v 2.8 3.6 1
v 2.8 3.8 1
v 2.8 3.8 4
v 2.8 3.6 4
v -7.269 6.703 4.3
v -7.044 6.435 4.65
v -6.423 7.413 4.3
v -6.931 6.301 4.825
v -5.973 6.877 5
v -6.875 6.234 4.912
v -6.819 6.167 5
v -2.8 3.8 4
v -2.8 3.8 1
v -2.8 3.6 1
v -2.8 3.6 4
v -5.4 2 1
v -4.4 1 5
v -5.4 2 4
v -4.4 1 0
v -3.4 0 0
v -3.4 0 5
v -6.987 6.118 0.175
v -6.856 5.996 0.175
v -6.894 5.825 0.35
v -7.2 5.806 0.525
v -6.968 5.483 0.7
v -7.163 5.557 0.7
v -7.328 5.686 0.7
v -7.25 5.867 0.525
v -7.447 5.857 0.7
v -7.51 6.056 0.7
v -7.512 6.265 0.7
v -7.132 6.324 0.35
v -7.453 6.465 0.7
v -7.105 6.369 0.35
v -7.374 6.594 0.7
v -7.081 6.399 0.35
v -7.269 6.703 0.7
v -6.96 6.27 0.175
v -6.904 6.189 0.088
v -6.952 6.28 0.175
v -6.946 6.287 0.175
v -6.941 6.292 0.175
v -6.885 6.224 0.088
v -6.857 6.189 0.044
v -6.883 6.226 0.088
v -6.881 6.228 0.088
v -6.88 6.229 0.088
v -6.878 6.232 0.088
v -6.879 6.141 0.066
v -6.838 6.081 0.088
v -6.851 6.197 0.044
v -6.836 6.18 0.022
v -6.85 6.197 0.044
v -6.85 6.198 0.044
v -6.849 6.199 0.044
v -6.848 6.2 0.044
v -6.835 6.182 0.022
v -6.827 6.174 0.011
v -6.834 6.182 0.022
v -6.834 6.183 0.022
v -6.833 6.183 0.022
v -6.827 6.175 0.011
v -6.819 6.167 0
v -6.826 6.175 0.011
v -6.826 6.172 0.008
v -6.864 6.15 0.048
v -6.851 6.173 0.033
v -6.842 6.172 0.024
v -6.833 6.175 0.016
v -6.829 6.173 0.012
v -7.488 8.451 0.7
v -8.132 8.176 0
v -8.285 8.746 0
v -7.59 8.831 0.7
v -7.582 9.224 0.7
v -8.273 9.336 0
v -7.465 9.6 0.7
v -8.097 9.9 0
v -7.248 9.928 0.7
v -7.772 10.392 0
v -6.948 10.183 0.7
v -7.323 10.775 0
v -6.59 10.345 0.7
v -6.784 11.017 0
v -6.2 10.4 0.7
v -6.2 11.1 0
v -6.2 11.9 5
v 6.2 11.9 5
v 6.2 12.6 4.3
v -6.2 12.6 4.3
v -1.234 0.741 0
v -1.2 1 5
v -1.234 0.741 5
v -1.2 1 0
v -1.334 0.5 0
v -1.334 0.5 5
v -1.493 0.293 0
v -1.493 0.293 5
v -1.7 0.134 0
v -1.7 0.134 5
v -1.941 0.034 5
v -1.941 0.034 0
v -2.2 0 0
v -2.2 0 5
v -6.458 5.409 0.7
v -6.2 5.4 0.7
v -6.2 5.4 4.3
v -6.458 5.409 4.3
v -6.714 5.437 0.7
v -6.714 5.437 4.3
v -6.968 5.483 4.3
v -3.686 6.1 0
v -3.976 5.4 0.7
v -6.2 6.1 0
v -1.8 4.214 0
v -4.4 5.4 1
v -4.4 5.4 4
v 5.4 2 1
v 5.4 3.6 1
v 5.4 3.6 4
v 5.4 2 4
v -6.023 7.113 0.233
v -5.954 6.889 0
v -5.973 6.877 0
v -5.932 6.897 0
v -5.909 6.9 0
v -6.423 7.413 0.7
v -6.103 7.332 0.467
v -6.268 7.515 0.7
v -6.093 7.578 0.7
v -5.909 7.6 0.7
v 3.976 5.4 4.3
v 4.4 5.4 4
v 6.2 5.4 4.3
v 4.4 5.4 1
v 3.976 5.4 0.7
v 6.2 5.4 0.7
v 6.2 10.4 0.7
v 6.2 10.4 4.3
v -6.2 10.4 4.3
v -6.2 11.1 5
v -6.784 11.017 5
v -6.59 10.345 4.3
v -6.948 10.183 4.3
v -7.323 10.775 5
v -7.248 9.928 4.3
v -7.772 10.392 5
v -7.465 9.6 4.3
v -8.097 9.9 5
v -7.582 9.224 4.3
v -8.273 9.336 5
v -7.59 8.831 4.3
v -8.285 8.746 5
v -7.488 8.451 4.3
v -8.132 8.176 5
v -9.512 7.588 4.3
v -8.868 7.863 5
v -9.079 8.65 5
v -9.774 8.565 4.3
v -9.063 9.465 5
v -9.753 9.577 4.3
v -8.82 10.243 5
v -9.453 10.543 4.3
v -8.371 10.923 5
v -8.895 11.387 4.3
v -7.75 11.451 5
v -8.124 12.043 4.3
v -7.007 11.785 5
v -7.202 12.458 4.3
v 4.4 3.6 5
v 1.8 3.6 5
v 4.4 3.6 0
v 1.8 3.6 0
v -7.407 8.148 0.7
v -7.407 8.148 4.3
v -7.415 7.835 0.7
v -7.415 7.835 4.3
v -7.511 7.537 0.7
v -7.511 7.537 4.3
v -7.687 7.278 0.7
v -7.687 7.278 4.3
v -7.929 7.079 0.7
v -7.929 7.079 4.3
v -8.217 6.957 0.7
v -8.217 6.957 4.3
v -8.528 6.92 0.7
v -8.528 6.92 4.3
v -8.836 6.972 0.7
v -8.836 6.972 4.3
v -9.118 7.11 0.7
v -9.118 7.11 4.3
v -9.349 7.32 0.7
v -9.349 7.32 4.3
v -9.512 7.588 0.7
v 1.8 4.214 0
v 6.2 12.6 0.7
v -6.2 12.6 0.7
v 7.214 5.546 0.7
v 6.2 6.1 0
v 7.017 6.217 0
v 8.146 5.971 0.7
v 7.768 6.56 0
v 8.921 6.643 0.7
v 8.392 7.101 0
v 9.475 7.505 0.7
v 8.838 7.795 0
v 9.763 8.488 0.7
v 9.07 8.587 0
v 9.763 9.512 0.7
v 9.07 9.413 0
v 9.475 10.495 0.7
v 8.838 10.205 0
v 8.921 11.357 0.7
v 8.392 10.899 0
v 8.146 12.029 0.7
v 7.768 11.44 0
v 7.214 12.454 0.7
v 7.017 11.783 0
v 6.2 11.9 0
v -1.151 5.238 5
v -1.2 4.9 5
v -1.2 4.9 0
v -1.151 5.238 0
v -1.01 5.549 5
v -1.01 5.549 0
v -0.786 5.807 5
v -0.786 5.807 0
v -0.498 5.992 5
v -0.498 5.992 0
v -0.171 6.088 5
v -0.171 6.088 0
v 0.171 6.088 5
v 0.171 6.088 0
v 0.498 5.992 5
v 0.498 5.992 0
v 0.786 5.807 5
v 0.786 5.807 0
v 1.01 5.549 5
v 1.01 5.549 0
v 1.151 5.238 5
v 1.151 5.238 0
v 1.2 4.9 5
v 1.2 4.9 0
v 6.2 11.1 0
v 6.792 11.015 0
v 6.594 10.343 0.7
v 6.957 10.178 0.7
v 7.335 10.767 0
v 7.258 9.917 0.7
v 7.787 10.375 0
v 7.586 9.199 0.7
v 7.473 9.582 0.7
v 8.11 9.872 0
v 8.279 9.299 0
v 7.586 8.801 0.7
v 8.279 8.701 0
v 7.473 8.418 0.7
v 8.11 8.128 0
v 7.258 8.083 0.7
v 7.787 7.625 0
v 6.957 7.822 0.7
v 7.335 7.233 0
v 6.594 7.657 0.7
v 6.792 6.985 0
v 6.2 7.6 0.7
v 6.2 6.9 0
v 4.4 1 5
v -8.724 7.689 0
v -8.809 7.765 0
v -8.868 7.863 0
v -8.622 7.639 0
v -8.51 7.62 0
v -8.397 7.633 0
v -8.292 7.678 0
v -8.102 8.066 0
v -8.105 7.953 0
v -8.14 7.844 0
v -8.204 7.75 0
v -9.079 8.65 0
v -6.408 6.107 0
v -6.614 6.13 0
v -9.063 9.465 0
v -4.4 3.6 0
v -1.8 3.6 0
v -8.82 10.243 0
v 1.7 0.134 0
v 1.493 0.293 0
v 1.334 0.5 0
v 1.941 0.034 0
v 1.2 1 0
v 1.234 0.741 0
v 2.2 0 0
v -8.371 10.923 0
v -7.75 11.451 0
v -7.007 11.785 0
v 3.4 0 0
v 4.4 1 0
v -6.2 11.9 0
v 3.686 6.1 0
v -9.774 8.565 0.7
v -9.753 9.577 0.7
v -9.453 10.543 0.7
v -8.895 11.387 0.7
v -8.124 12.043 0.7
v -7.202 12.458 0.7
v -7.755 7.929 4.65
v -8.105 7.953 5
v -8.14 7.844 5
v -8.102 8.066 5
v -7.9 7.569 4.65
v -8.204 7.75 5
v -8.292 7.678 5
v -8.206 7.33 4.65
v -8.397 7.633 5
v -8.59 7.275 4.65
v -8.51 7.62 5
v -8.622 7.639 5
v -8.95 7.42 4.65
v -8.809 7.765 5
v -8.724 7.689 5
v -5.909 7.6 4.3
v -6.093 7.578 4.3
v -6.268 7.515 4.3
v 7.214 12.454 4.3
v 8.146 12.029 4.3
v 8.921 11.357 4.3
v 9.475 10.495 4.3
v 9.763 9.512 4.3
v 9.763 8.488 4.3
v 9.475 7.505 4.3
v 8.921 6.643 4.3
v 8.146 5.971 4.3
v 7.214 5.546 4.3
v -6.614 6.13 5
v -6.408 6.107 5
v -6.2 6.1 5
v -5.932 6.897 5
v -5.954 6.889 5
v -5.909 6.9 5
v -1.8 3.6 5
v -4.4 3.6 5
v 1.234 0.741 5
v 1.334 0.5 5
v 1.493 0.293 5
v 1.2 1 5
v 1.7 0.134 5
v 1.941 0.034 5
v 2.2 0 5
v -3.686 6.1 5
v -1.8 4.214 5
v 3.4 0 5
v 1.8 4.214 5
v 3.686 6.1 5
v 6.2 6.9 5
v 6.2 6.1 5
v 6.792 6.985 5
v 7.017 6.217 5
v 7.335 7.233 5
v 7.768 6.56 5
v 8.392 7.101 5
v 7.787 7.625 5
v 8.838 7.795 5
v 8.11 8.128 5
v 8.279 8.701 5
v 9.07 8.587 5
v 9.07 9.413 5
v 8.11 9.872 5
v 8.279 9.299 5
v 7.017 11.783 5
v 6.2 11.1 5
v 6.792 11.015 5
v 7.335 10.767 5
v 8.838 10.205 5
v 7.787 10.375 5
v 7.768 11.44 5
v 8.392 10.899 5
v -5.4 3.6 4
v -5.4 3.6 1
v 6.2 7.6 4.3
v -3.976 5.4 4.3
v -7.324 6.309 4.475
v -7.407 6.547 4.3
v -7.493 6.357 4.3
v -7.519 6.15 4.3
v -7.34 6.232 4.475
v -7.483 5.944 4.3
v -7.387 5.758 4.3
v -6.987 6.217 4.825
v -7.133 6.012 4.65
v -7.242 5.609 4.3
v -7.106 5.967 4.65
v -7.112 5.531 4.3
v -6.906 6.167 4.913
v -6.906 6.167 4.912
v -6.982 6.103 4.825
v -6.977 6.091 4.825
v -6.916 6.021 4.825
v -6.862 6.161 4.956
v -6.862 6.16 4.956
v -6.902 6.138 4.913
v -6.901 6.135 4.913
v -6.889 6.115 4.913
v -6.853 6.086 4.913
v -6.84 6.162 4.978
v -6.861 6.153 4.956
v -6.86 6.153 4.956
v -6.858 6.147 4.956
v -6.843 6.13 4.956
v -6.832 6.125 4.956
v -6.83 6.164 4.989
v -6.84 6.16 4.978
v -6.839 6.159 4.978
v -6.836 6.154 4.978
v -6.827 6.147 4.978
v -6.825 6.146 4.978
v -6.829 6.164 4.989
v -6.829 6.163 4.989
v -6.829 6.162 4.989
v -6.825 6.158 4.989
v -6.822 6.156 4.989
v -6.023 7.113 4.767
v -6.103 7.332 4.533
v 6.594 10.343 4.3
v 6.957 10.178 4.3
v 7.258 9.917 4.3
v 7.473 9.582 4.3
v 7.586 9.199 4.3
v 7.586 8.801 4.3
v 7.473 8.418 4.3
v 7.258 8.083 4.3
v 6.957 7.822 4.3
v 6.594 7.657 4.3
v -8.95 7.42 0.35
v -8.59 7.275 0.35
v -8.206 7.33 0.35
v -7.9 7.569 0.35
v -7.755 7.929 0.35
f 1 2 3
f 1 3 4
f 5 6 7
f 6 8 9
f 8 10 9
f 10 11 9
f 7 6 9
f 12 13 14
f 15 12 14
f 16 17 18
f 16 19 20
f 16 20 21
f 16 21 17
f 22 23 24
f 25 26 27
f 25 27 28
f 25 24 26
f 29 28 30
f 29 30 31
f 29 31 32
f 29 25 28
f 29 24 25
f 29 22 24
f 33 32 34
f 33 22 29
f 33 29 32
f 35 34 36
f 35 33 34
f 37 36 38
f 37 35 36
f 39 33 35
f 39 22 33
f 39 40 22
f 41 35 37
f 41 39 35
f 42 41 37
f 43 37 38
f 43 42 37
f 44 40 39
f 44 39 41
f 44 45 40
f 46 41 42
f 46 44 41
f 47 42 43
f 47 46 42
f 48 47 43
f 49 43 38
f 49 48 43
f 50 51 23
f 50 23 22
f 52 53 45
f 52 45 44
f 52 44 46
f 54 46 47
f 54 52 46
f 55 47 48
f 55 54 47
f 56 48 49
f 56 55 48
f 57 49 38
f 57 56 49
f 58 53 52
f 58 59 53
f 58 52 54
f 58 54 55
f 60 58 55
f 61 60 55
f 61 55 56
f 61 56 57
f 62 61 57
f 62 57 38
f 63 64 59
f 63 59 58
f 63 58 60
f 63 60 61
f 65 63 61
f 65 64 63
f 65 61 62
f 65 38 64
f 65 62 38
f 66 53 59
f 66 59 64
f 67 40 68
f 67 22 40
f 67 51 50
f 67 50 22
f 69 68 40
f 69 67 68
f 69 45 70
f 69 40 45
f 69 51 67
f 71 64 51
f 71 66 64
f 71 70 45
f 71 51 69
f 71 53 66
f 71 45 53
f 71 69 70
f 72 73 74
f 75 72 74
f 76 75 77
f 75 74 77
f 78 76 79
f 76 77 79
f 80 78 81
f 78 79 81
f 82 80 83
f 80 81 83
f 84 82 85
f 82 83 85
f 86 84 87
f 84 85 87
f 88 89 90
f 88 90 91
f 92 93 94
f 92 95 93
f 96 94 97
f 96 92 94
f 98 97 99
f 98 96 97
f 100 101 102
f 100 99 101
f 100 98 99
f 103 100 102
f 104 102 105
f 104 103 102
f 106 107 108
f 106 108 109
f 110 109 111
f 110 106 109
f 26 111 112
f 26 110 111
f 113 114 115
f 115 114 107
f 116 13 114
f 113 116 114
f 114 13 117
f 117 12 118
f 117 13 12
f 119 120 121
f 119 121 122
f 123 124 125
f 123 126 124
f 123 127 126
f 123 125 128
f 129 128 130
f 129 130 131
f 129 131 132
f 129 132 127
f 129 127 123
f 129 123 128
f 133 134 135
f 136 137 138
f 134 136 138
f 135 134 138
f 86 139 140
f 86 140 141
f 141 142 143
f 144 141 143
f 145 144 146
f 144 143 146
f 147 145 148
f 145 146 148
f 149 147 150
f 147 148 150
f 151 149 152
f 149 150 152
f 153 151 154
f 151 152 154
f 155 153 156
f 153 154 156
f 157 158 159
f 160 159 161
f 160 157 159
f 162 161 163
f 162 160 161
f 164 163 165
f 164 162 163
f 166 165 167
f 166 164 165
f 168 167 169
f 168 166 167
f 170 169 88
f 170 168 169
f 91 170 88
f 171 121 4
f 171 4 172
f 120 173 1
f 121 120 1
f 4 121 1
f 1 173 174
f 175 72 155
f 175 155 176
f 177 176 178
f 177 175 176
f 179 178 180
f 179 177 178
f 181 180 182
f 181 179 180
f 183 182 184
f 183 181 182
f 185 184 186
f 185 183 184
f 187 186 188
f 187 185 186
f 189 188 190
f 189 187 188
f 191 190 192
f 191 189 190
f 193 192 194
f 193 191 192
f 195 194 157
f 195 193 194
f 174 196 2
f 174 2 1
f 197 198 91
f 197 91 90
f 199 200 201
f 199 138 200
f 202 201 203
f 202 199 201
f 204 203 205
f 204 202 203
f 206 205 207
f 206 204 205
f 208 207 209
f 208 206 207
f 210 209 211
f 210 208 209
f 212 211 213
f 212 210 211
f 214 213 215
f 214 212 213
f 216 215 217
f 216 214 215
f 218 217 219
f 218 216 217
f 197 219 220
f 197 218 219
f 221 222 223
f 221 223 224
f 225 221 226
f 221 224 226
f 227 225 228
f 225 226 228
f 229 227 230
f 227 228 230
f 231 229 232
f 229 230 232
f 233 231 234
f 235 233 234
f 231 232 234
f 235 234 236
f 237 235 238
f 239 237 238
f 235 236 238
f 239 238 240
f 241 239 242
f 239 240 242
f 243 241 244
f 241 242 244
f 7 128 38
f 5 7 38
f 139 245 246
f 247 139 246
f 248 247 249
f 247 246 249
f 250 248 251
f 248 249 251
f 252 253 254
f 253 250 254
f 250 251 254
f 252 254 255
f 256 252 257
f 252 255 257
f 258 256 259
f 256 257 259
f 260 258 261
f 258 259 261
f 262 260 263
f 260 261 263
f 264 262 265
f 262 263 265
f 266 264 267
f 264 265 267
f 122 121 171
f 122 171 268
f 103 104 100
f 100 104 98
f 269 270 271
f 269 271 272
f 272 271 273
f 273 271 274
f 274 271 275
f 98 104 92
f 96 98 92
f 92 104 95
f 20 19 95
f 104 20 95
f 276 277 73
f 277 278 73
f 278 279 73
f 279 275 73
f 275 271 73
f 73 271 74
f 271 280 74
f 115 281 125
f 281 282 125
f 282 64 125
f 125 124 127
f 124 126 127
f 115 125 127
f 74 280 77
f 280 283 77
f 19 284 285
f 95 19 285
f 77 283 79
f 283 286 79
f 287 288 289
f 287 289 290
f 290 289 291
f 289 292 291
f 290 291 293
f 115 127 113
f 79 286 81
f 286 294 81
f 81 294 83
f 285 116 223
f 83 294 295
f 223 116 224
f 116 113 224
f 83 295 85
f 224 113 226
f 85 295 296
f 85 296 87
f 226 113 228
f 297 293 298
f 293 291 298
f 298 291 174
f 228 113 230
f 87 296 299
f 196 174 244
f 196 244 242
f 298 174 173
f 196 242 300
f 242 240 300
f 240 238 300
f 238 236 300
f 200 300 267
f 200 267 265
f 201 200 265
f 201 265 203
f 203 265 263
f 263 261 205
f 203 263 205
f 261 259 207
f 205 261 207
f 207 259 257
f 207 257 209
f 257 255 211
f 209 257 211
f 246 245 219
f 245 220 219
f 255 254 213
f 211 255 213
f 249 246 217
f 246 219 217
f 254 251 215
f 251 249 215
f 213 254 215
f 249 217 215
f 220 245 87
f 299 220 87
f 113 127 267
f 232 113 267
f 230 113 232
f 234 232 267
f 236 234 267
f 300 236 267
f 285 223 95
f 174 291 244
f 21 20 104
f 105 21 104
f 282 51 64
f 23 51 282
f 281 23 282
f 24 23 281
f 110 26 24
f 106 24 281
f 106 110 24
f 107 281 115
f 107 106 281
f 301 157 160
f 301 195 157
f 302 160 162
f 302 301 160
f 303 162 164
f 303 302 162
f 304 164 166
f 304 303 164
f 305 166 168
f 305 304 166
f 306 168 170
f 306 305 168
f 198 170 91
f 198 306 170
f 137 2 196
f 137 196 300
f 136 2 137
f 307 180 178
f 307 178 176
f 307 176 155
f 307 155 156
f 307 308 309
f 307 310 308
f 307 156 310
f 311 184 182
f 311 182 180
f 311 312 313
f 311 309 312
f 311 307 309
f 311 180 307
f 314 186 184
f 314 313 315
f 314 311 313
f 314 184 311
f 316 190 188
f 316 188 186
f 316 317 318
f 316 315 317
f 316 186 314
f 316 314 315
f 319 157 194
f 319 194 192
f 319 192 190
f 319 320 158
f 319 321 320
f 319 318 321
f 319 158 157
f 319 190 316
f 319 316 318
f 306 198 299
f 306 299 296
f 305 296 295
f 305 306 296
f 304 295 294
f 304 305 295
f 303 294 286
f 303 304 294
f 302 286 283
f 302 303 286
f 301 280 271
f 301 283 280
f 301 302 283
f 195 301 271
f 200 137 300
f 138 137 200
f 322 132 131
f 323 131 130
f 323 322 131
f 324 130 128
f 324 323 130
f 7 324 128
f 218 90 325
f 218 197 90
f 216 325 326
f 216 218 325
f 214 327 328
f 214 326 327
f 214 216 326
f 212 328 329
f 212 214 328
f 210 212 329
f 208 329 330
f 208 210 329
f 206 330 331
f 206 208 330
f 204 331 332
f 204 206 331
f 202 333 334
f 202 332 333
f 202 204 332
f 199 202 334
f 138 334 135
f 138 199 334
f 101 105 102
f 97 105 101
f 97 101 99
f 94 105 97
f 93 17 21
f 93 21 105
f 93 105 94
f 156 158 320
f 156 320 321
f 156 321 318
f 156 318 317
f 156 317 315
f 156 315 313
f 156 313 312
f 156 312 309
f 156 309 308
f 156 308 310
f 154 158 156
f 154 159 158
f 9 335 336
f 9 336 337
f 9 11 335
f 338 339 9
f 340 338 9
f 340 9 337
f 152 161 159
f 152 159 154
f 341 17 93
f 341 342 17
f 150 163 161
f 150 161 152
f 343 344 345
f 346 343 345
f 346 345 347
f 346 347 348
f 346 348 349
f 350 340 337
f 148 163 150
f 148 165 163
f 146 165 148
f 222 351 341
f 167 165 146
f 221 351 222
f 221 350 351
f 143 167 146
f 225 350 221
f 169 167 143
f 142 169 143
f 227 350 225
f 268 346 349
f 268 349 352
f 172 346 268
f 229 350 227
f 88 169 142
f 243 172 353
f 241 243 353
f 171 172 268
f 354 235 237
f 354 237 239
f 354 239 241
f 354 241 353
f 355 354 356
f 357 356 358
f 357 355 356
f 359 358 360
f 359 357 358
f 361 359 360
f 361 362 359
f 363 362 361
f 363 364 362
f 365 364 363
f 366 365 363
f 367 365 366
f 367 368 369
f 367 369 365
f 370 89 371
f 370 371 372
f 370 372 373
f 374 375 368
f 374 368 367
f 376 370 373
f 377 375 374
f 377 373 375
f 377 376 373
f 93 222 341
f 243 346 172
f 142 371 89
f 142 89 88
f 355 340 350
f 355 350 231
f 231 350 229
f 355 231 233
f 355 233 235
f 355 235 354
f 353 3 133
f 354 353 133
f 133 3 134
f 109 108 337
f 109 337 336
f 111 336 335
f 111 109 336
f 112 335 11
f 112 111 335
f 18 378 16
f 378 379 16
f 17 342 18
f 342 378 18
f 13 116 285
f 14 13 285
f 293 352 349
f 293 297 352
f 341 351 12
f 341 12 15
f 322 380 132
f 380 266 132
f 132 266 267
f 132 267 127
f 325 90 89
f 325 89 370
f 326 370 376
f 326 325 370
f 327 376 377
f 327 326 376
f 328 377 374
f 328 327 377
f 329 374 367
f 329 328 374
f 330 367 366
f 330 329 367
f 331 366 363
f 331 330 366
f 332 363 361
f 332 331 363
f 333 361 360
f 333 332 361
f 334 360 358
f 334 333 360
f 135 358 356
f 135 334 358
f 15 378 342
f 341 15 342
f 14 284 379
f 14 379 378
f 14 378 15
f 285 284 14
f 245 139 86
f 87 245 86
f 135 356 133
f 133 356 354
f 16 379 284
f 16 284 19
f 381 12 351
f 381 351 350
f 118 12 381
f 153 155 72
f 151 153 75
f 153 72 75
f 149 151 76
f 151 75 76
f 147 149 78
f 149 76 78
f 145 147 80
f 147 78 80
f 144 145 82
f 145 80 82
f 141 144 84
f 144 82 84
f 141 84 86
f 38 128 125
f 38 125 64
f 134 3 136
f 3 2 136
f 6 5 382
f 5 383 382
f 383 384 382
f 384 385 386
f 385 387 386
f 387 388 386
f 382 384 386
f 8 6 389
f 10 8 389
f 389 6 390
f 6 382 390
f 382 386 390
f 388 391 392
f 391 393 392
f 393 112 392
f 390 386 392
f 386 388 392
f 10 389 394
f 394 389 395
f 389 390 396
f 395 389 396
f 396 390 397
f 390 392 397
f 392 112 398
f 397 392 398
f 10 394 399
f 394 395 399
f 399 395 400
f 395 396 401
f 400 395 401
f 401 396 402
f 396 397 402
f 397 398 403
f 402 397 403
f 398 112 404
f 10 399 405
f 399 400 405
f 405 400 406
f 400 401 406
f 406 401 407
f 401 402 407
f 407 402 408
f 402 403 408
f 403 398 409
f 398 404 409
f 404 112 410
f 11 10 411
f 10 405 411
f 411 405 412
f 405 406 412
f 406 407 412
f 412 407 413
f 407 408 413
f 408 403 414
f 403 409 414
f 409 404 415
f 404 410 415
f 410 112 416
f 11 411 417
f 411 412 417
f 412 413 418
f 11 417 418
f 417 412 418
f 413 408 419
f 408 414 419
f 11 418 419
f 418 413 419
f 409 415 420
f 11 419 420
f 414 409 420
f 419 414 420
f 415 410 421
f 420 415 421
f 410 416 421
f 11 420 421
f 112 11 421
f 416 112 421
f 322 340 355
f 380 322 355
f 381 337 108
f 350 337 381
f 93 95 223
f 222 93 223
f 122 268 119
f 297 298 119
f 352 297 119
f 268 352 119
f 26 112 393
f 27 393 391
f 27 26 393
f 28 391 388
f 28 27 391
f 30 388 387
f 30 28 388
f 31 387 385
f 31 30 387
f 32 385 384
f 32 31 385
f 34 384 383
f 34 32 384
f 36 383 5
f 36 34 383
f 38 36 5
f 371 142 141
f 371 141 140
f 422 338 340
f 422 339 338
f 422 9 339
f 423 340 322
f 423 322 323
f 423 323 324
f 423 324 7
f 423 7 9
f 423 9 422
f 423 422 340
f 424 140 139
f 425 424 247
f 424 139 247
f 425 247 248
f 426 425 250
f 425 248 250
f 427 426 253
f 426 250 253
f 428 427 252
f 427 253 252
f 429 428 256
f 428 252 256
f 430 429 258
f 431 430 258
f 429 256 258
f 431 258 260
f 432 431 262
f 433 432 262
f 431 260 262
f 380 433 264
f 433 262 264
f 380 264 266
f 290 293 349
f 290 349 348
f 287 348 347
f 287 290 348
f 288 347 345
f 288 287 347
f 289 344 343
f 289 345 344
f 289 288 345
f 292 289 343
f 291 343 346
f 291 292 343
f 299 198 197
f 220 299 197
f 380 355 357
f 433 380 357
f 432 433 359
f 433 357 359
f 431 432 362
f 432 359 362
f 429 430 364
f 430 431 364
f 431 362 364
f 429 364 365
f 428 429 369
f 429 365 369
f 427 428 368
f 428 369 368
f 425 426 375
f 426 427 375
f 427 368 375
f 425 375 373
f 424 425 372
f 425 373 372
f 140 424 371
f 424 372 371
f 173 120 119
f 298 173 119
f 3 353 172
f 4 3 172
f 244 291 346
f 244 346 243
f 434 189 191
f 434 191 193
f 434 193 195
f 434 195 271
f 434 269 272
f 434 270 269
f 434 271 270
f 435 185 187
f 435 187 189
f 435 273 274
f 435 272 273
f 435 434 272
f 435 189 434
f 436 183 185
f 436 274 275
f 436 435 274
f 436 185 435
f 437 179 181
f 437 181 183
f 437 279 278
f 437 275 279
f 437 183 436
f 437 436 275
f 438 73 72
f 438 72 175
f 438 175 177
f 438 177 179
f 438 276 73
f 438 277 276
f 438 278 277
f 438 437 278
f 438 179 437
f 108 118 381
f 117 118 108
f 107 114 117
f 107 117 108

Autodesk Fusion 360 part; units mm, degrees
sketch "base" plane through (0, 0, 0) normal (0, 0, 1) x (1, 0, 0)
  line L0 (-3.4, 0) -> (-2.2, 0)
  arc A0 (-2.2, 0) -> (-1.2, 1) centre (-2.2, 1) ccw
  line L1 (-1.2, 1) -> (-1.2, 4.9)
  line L2 (-3.4, 0) -> (-5.4, 2)
  line L3 (-5.4, 3.6) -> (-2.8, 3.6)
  line L4 (-2.8, 3.8) -> (-4.4, 5.4)
  line L5 (-2.2, 0) -> (0, 0) construction
  line L6 (-5.4, 3.6) -> (-5.4, 2)
  line L7 (0, 7.6) -> (-6.2, 7.6)
  arc A1 (-6.2, 10.4) -> (-6.2, 7.6) centre (-6.2, 9) ccw
  line L8 (-6.2, 10.4) -> (0, 10.4)
  line L9 (-4.4, 5.4) -> (-6.2, 5.4)
  arc A2 (-6.2, 12.6) -> (-6.2, 5.4) centre (-6.2, 9) ccw
  line L10 (-6.2, 12.6) -> (0, 12.6)
  line L11 (0, 12.6) -> (0, 0) construction
  line L12 (-2.8, 3.8) -> (-2.8, 3.6)
  arc A3 (6.2, 7.6) -> (6.2, 10.4) centre (6.2, 9) ccw
  line L13 (6.2, 10.4) -> (0, 10.4)
  line L14 (0, 7.6) -> (6.2, 7.6)
  arc A4 (0, 6.1) -> (-1.2, 4.9) centre (0, 4.9) ccw
  line L15 (6.2, 12.6) -> (0, 12.6)
  arc A5 (6.2, 5.4) -> (6.2, 12.6) centre (6.2, 9) ccw
  line L16 (4.4, 5.4) -> (6.2, 5.4)
  line L17 (2.8, 3.8) -> (4.4, 5.4)
  line L18 (2.8, 3.8) -> (2.8, 3.6)
  line L19 (5.4, 3.6) -> (2.8, 3.6)
  line L20 (5.4, 3.6) -> (5.4, 2)
  line L21 (3.4, 0) -> (5.4, 2)
  line L22 (3.4, 0) -> (2.2, 0)
  arc A6 (1.2, 1) -> (2.2, 0) centre (2.2, 1) ccw
  arc A7 (1.2, 4.9) -> (0, 6.1) centre (0, 4.9) ccw
  line L23 (1.2, 1) -> (1.2, 4.9)
  line L24 (-6.2, 7.6) -> (-7.2689, 6.7031)
  arc A8 (-9.5116, 7.5881) -> (-7.4878, 8.4509) centre (-8.4997, 8.0195) ccw
  line L25 (-6.2, 9) -> (-9.5116, 7.5881) construction
  arc A9 (-7.2689, 6.7031) -> (-6.9684, 5.483) centre (-6.819, 6.1668) ccw
  dimension "d6" = 4.2
  dimension "d7" = 135
  dimension "d8" = 45
  dimension "d9" = 1
  dimension "d10" = 1.2
  dimension "d17" = 2.2
  dimension "d18" = 2.8
  dimension "d20" = 6.2
  dimension "d27" = 0.2
  dimension "d28" = 2.6
  dimension "d29" = 1.6
  dimension "d31" = 2
  dimension "d32" = 1.8
  dimension "d33" = 1.5
  dimension "d58" = 0.6996
  dimension "d59" = 0.7
  dimension "d60" = 140
extrude "Extrude1" add sketch "base" along normal blind 5 contours L0 A0 L1 L2 L3 L4 L6 L7 A1 L8 L9 A2 L10 L12 A3 L13 L14 A4 L15 A5 L16 L17 L18 L19 L20 L21 L22 A6 A7 L23 L24 A8 A9
fillet "Fillet1" radius 0.8 1 edges at (-6.2, 7.6, 2.5)
chamfer "Chamfer1" distance 1 angle 45 12 edges at (-5.4, 2.8, 5) (-5.4, 2.8, 0) (5.4, 2.8, 0) (5.4, 2.8, 5) (-3.6, 4.6, 5) (-2.8, 3.7, 5) (2.8, 3.7, 5) (3.6, 4.6, 5) (2.8, 3.7, 0) (3.6, 4.6, 0) (-3.6, 4.6, 0) (-2.8, 3.7, 0)
chamfer "Chamfer3" distance 0.7 angle 45 12 edges at (0.1456, 7.6, 0) (7.6, 9, 0) (0, 10.4, 5) (7.6, 9, 5) (0, 10.4, 0) (-7.3681, 9.7718, 0) (0.1456, 7.6, 5) (-7.3681, 9.7718, 5) (-6.1824, 7.5518, 5) (-6.846, 7.0579, 5) (-6.1824, 7.5518, 0) (-6.846, 7.0579, 0) tangent chain off
